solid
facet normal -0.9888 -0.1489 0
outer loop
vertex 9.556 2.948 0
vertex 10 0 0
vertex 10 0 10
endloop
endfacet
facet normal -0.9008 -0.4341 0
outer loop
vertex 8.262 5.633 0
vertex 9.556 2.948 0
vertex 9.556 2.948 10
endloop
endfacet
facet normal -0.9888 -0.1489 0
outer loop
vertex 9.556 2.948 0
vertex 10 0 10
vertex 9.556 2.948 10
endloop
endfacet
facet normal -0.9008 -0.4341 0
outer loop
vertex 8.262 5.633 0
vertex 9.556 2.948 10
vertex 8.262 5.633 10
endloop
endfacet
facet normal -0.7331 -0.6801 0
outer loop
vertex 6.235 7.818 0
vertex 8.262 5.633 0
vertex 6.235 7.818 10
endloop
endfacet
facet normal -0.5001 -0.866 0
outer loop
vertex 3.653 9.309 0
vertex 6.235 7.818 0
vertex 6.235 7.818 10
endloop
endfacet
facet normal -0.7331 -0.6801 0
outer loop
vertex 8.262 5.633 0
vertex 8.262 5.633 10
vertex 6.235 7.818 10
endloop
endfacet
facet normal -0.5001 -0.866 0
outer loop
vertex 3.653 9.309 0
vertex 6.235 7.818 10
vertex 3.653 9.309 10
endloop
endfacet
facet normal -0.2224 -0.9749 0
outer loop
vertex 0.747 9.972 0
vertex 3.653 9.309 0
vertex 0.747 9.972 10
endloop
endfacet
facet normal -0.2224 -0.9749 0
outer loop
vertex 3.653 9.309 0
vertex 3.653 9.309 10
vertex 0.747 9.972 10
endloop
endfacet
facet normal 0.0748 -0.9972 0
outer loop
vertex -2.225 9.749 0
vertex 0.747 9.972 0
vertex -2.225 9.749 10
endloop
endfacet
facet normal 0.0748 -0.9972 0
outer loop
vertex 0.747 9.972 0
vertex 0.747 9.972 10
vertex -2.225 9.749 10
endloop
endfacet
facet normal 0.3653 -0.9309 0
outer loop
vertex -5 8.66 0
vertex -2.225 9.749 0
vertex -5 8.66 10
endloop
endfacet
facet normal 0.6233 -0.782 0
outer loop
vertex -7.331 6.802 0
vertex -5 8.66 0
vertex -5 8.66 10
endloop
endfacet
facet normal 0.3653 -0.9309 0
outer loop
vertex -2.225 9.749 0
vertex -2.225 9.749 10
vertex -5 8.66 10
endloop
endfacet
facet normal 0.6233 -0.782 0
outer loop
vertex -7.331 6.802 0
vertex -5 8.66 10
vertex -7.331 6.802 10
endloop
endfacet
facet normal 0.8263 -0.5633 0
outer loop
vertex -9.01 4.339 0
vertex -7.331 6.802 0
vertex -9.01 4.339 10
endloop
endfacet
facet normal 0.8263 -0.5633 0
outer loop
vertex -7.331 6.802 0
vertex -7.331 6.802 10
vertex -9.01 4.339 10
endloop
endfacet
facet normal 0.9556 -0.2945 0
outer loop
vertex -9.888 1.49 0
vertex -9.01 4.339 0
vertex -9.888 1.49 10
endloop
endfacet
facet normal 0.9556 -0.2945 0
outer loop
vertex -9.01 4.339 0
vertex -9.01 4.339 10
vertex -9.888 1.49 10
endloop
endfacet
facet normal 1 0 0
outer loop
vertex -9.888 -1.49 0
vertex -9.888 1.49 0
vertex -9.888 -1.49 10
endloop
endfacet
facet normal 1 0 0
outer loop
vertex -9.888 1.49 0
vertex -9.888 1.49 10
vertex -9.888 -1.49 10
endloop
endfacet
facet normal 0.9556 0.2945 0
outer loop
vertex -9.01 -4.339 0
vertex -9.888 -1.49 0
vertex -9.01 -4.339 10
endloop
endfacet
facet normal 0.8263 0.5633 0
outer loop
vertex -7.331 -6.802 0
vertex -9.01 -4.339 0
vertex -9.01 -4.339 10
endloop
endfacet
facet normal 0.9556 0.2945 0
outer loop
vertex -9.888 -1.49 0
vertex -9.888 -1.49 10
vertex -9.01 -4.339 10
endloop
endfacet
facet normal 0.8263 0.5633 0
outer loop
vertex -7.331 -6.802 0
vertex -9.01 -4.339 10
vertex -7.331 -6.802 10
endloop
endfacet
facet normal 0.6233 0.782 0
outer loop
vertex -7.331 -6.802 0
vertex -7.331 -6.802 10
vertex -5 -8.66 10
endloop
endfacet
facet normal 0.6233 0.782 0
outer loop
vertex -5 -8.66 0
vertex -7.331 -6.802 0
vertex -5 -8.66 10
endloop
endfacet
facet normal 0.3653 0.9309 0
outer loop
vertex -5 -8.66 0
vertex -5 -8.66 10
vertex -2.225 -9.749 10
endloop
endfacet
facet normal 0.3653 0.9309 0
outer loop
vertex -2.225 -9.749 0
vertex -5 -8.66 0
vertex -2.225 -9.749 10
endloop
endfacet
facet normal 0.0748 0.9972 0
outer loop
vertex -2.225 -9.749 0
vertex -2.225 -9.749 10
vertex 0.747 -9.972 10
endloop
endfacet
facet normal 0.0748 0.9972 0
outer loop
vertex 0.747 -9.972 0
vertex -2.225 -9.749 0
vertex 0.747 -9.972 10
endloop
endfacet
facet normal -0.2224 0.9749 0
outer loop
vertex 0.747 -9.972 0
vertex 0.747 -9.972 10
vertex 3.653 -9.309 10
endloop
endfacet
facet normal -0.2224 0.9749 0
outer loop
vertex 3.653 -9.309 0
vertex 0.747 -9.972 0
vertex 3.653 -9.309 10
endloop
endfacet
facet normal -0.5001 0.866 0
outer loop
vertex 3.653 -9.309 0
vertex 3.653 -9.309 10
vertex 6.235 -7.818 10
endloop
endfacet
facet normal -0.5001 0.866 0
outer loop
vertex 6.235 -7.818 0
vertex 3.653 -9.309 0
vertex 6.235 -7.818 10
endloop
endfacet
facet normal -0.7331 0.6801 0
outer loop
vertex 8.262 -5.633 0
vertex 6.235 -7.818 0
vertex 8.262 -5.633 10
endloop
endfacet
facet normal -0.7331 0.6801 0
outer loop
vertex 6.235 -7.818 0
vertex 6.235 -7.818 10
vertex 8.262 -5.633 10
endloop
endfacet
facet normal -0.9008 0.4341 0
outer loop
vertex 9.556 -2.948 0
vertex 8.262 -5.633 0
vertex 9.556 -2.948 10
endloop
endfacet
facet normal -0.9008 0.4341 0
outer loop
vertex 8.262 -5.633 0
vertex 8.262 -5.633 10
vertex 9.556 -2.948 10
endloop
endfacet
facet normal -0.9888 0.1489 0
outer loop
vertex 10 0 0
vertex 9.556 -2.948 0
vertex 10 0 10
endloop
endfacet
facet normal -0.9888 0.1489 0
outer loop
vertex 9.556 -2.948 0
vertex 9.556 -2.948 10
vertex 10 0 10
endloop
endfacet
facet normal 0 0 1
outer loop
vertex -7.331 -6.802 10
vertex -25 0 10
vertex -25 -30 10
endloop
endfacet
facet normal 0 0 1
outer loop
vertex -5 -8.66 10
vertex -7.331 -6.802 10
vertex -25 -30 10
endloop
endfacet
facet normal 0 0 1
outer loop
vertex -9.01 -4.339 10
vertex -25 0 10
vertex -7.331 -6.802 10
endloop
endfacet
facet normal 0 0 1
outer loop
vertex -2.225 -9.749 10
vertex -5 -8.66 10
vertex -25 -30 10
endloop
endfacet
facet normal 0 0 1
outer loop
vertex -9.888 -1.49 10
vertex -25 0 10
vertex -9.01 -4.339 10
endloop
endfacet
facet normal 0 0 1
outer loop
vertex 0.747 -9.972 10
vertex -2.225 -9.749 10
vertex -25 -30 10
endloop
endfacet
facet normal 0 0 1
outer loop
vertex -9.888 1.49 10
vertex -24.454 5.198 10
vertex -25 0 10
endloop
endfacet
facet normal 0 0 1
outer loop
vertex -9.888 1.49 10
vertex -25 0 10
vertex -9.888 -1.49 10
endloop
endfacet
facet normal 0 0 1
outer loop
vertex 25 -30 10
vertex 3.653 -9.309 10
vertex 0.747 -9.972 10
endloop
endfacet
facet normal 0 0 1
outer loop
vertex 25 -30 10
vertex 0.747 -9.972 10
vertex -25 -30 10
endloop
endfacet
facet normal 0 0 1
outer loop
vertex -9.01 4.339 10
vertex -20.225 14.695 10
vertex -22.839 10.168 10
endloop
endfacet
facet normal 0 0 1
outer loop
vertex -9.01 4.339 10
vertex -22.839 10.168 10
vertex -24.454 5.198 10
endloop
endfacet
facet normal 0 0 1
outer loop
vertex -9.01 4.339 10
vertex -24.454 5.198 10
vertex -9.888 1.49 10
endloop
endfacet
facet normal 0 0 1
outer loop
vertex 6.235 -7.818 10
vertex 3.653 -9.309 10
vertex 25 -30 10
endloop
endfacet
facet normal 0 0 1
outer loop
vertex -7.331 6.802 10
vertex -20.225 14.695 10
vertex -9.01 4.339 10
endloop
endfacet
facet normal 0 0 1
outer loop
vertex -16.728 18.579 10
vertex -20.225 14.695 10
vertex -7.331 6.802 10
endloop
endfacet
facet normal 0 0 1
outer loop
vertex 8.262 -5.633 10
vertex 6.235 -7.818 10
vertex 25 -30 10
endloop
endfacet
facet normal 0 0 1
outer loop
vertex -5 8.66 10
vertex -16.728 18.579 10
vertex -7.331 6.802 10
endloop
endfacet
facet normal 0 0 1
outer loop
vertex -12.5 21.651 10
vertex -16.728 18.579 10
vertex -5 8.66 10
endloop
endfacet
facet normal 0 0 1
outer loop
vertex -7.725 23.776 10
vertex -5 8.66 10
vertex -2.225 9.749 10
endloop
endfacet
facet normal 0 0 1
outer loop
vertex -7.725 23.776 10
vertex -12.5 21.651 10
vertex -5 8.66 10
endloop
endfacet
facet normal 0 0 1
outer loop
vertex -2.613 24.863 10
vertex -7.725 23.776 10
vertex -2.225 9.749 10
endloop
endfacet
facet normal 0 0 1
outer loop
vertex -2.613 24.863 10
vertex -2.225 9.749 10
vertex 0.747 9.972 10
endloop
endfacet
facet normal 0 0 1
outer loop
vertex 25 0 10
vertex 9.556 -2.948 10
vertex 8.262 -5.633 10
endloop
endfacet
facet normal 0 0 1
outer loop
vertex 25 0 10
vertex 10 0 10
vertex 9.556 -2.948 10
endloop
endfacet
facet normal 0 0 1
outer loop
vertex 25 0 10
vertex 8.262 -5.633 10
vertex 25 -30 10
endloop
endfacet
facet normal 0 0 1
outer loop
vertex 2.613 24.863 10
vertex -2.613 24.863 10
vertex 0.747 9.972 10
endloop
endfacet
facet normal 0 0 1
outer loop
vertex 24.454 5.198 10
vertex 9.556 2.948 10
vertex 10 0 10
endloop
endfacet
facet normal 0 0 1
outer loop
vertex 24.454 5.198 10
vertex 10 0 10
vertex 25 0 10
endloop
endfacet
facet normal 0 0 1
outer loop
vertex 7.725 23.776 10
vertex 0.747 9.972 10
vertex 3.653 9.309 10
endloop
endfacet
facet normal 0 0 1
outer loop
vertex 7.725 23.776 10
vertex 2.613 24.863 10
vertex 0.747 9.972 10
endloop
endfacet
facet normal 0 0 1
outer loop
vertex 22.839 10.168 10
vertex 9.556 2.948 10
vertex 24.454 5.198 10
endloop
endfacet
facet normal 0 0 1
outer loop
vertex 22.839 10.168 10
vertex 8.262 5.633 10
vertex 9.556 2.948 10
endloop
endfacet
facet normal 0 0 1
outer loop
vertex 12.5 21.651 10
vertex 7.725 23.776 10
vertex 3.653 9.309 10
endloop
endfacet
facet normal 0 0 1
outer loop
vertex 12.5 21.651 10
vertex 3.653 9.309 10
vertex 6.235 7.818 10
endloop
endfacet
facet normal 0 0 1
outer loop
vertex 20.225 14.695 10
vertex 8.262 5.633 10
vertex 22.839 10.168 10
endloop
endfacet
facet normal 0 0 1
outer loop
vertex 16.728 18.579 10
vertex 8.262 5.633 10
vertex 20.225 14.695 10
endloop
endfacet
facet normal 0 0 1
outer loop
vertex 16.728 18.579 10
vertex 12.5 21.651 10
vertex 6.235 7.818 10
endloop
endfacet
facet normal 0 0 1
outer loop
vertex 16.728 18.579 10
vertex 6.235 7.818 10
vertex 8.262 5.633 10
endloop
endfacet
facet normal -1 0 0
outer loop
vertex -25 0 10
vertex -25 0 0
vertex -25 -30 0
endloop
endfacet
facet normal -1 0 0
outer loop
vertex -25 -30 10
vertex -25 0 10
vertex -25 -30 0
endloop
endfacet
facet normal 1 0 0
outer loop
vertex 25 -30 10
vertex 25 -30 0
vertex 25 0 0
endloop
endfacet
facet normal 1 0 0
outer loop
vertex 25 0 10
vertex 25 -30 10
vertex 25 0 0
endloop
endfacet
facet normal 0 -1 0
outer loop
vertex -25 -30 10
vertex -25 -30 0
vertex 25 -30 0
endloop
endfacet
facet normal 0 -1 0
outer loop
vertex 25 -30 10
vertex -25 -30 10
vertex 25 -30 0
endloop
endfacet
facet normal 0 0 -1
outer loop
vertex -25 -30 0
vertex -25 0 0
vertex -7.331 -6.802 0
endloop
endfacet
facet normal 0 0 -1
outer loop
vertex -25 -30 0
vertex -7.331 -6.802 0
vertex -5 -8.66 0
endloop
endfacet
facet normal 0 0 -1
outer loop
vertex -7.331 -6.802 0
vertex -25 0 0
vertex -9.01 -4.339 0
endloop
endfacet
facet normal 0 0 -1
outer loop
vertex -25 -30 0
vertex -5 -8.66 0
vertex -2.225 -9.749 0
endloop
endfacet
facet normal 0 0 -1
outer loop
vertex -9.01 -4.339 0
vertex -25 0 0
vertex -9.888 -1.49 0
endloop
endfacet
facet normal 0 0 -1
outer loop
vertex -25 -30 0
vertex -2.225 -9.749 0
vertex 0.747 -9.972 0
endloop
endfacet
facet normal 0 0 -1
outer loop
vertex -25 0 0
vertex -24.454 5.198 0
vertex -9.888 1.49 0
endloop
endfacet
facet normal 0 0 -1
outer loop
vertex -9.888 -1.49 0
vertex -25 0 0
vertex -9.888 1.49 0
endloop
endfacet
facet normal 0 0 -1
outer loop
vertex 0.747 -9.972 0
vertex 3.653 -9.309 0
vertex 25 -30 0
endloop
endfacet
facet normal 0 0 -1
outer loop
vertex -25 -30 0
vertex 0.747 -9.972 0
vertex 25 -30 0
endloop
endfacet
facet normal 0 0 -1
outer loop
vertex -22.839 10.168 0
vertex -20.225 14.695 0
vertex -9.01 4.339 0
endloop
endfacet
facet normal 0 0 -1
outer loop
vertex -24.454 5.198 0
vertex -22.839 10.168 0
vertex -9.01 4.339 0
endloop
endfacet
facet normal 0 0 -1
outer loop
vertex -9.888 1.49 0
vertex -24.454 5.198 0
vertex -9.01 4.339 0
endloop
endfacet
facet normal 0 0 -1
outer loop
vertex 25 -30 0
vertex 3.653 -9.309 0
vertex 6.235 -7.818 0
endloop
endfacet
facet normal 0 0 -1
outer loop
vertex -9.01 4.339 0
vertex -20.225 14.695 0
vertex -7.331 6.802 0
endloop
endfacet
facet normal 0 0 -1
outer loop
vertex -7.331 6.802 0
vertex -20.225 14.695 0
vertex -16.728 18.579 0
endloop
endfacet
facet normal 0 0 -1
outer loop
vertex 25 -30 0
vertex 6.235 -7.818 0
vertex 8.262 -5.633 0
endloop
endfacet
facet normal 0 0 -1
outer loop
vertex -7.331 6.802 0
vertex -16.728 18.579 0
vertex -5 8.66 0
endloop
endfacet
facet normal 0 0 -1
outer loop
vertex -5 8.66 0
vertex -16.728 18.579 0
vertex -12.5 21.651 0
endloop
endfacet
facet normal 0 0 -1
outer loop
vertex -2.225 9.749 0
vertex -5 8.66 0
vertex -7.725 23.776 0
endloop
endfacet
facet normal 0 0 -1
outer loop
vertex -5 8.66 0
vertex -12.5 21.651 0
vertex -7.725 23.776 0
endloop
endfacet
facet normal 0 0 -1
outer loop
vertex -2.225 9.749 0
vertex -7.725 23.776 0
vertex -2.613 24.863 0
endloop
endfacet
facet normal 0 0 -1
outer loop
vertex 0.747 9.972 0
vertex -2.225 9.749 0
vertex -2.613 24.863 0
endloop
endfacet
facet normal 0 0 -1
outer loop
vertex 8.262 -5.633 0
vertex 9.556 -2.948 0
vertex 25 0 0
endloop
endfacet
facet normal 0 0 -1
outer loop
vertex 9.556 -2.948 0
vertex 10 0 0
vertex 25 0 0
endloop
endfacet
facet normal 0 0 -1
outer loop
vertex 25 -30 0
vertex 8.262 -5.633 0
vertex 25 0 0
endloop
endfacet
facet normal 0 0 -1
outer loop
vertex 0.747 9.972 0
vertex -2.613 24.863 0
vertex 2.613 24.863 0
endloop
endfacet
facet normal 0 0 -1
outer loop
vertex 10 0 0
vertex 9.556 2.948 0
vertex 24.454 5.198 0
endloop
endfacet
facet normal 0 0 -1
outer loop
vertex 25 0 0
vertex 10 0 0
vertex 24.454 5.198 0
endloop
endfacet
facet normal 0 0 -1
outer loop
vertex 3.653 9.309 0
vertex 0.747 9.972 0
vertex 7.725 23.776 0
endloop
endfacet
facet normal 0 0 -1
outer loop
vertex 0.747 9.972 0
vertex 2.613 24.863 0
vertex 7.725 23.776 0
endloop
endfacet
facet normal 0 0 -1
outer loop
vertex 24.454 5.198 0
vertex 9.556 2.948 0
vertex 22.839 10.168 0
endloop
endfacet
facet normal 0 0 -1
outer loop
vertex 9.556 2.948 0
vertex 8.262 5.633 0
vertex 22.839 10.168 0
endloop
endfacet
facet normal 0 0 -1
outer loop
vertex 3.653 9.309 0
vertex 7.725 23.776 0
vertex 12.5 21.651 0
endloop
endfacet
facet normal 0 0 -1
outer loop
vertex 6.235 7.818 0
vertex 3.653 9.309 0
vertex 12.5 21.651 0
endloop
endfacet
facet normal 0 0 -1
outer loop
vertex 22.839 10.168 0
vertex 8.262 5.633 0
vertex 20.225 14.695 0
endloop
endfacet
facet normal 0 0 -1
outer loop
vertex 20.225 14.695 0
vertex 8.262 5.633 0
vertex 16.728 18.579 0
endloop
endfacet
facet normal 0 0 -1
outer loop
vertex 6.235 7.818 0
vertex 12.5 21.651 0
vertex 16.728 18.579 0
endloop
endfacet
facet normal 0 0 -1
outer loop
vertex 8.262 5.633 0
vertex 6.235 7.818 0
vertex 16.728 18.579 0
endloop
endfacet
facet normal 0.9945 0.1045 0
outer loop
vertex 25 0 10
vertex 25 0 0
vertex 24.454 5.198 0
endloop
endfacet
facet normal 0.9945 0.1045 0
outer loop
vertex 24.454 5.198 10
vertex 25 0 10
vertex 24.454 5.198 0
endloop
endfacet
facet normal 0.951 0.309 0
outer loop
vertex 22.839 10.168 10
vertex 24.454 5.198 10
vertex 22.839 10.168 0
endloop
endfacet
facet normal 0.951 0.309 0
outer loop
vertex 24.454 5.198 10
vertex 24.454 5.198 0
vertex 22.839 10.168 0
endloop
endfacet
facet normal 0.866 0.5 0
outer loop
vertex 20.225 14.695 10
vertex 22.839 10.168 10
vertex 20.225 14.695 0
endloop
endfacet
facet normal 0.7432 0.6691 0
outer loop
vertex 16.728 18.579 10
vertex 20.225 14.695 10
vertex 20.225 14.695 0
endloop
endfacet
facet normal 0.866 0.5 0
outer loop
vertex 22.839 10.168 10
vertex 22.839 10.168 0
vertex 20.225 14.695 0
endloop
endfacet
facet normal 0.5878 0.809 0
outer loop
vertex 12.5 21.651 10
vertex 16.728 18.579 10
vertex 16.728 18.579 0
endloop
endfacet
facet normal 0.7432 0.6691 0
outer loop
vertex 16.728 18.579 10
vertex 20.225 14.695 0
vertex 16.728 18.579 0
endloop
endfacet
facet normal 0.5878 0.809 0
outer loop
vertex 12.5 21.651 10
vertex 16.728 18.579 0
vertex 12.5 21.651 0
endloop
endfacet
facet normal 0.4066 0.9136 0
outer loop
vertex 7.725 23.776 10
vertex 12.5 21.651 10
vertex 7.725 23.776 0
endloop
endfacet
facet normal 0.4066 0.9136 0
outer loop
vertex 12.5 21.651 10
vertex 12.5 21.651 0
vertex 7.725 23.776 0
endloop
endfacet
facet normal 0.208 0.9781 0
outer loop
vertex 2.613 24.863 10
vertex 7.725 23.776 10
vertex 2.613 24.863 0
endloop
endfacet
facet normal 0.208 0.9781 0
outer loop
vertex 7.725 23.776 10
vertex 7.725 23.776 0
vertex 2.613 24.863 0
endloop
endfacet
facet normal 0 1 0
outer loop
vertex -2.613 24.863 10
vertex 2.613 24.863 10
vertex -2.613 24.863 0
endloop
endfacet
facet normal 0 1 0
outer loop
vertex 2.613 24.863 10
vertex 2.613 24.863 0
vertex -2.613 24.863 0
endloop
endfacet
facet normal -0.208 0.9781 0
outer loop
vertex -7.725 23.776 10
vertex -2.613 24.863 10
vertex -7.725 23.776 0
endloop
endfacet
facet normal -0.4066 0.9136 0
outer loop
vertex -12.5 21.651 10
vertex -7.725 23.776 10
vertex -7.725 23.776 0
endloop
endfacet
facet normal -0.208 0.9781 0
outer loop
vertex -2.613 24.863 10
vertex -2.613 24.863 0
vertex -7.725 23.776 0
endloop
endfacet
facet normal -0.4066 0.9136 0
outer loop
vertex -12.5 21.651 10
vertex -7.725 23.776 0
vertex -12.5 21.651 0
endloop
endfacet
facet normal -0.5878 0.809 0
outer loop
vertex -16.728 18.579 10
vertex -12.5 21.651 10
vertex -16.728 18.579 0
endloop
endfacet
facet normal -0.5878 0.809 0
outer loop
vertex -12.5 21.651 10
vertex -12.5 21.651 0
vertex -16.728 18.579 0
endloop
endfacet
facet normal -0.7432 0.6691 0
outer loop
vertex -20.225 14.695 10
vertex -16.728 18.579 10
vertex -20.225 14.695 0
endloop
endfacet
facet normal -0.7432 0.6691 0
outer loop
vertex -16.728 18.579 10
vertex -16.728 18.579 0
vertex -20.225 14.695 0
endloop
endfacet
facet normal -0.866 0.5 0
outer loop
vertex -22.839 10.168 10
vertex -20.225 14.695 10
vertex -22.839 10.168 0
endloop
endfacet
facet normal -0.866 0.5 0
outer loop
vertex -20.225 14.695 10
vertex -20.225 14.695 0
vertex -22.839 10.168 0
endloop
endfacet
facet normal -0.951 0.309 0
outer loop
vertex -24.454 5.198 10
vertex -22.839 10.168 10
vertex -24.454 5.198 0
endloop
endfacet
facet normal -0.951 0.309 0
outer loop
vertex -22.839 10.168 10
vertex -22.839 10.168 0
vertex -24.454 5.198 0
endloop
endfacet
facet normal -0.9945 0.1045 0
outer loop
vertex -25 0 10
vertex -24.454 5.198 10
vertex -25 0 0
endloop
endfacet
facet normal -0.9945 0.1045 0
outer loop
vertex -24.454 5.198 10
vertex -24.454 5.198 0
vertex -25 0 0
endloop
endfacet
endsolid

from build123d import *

# Parameters (mm, degrees)
BOSS_EXTRUDE1_DEPTH = 10
SKETCH2_R           = 10
CUT_EXTRUDE1_DEPTH  = 10


with BuildPart() as part:
    # Sketch1 → Boss-Extrude1 (new body)
    with BuildSketch(Plane.XY):
        with BuildLine():
            Line((-25, 0), (-25, -30))
            Line((-25, -30), (25, -30))
            Line((25, -30), (25, 0))
            ThreePointArc((25, 0), (0, 25), (-25, 0))
        make_face()
    extrude(amount=BOSS_EXTRUDE1_DEPTH)

    # Sketch2 → Cut-Extrude1 (cut)
    with BuildSketch(Plane.XY.offset(10)):
        Circle(SKETCH2_R)
    extrude(amount=-CUT_EXTRUDE1_DEPTH, mode=Mode.SUBTRACT)


solid = part.part
